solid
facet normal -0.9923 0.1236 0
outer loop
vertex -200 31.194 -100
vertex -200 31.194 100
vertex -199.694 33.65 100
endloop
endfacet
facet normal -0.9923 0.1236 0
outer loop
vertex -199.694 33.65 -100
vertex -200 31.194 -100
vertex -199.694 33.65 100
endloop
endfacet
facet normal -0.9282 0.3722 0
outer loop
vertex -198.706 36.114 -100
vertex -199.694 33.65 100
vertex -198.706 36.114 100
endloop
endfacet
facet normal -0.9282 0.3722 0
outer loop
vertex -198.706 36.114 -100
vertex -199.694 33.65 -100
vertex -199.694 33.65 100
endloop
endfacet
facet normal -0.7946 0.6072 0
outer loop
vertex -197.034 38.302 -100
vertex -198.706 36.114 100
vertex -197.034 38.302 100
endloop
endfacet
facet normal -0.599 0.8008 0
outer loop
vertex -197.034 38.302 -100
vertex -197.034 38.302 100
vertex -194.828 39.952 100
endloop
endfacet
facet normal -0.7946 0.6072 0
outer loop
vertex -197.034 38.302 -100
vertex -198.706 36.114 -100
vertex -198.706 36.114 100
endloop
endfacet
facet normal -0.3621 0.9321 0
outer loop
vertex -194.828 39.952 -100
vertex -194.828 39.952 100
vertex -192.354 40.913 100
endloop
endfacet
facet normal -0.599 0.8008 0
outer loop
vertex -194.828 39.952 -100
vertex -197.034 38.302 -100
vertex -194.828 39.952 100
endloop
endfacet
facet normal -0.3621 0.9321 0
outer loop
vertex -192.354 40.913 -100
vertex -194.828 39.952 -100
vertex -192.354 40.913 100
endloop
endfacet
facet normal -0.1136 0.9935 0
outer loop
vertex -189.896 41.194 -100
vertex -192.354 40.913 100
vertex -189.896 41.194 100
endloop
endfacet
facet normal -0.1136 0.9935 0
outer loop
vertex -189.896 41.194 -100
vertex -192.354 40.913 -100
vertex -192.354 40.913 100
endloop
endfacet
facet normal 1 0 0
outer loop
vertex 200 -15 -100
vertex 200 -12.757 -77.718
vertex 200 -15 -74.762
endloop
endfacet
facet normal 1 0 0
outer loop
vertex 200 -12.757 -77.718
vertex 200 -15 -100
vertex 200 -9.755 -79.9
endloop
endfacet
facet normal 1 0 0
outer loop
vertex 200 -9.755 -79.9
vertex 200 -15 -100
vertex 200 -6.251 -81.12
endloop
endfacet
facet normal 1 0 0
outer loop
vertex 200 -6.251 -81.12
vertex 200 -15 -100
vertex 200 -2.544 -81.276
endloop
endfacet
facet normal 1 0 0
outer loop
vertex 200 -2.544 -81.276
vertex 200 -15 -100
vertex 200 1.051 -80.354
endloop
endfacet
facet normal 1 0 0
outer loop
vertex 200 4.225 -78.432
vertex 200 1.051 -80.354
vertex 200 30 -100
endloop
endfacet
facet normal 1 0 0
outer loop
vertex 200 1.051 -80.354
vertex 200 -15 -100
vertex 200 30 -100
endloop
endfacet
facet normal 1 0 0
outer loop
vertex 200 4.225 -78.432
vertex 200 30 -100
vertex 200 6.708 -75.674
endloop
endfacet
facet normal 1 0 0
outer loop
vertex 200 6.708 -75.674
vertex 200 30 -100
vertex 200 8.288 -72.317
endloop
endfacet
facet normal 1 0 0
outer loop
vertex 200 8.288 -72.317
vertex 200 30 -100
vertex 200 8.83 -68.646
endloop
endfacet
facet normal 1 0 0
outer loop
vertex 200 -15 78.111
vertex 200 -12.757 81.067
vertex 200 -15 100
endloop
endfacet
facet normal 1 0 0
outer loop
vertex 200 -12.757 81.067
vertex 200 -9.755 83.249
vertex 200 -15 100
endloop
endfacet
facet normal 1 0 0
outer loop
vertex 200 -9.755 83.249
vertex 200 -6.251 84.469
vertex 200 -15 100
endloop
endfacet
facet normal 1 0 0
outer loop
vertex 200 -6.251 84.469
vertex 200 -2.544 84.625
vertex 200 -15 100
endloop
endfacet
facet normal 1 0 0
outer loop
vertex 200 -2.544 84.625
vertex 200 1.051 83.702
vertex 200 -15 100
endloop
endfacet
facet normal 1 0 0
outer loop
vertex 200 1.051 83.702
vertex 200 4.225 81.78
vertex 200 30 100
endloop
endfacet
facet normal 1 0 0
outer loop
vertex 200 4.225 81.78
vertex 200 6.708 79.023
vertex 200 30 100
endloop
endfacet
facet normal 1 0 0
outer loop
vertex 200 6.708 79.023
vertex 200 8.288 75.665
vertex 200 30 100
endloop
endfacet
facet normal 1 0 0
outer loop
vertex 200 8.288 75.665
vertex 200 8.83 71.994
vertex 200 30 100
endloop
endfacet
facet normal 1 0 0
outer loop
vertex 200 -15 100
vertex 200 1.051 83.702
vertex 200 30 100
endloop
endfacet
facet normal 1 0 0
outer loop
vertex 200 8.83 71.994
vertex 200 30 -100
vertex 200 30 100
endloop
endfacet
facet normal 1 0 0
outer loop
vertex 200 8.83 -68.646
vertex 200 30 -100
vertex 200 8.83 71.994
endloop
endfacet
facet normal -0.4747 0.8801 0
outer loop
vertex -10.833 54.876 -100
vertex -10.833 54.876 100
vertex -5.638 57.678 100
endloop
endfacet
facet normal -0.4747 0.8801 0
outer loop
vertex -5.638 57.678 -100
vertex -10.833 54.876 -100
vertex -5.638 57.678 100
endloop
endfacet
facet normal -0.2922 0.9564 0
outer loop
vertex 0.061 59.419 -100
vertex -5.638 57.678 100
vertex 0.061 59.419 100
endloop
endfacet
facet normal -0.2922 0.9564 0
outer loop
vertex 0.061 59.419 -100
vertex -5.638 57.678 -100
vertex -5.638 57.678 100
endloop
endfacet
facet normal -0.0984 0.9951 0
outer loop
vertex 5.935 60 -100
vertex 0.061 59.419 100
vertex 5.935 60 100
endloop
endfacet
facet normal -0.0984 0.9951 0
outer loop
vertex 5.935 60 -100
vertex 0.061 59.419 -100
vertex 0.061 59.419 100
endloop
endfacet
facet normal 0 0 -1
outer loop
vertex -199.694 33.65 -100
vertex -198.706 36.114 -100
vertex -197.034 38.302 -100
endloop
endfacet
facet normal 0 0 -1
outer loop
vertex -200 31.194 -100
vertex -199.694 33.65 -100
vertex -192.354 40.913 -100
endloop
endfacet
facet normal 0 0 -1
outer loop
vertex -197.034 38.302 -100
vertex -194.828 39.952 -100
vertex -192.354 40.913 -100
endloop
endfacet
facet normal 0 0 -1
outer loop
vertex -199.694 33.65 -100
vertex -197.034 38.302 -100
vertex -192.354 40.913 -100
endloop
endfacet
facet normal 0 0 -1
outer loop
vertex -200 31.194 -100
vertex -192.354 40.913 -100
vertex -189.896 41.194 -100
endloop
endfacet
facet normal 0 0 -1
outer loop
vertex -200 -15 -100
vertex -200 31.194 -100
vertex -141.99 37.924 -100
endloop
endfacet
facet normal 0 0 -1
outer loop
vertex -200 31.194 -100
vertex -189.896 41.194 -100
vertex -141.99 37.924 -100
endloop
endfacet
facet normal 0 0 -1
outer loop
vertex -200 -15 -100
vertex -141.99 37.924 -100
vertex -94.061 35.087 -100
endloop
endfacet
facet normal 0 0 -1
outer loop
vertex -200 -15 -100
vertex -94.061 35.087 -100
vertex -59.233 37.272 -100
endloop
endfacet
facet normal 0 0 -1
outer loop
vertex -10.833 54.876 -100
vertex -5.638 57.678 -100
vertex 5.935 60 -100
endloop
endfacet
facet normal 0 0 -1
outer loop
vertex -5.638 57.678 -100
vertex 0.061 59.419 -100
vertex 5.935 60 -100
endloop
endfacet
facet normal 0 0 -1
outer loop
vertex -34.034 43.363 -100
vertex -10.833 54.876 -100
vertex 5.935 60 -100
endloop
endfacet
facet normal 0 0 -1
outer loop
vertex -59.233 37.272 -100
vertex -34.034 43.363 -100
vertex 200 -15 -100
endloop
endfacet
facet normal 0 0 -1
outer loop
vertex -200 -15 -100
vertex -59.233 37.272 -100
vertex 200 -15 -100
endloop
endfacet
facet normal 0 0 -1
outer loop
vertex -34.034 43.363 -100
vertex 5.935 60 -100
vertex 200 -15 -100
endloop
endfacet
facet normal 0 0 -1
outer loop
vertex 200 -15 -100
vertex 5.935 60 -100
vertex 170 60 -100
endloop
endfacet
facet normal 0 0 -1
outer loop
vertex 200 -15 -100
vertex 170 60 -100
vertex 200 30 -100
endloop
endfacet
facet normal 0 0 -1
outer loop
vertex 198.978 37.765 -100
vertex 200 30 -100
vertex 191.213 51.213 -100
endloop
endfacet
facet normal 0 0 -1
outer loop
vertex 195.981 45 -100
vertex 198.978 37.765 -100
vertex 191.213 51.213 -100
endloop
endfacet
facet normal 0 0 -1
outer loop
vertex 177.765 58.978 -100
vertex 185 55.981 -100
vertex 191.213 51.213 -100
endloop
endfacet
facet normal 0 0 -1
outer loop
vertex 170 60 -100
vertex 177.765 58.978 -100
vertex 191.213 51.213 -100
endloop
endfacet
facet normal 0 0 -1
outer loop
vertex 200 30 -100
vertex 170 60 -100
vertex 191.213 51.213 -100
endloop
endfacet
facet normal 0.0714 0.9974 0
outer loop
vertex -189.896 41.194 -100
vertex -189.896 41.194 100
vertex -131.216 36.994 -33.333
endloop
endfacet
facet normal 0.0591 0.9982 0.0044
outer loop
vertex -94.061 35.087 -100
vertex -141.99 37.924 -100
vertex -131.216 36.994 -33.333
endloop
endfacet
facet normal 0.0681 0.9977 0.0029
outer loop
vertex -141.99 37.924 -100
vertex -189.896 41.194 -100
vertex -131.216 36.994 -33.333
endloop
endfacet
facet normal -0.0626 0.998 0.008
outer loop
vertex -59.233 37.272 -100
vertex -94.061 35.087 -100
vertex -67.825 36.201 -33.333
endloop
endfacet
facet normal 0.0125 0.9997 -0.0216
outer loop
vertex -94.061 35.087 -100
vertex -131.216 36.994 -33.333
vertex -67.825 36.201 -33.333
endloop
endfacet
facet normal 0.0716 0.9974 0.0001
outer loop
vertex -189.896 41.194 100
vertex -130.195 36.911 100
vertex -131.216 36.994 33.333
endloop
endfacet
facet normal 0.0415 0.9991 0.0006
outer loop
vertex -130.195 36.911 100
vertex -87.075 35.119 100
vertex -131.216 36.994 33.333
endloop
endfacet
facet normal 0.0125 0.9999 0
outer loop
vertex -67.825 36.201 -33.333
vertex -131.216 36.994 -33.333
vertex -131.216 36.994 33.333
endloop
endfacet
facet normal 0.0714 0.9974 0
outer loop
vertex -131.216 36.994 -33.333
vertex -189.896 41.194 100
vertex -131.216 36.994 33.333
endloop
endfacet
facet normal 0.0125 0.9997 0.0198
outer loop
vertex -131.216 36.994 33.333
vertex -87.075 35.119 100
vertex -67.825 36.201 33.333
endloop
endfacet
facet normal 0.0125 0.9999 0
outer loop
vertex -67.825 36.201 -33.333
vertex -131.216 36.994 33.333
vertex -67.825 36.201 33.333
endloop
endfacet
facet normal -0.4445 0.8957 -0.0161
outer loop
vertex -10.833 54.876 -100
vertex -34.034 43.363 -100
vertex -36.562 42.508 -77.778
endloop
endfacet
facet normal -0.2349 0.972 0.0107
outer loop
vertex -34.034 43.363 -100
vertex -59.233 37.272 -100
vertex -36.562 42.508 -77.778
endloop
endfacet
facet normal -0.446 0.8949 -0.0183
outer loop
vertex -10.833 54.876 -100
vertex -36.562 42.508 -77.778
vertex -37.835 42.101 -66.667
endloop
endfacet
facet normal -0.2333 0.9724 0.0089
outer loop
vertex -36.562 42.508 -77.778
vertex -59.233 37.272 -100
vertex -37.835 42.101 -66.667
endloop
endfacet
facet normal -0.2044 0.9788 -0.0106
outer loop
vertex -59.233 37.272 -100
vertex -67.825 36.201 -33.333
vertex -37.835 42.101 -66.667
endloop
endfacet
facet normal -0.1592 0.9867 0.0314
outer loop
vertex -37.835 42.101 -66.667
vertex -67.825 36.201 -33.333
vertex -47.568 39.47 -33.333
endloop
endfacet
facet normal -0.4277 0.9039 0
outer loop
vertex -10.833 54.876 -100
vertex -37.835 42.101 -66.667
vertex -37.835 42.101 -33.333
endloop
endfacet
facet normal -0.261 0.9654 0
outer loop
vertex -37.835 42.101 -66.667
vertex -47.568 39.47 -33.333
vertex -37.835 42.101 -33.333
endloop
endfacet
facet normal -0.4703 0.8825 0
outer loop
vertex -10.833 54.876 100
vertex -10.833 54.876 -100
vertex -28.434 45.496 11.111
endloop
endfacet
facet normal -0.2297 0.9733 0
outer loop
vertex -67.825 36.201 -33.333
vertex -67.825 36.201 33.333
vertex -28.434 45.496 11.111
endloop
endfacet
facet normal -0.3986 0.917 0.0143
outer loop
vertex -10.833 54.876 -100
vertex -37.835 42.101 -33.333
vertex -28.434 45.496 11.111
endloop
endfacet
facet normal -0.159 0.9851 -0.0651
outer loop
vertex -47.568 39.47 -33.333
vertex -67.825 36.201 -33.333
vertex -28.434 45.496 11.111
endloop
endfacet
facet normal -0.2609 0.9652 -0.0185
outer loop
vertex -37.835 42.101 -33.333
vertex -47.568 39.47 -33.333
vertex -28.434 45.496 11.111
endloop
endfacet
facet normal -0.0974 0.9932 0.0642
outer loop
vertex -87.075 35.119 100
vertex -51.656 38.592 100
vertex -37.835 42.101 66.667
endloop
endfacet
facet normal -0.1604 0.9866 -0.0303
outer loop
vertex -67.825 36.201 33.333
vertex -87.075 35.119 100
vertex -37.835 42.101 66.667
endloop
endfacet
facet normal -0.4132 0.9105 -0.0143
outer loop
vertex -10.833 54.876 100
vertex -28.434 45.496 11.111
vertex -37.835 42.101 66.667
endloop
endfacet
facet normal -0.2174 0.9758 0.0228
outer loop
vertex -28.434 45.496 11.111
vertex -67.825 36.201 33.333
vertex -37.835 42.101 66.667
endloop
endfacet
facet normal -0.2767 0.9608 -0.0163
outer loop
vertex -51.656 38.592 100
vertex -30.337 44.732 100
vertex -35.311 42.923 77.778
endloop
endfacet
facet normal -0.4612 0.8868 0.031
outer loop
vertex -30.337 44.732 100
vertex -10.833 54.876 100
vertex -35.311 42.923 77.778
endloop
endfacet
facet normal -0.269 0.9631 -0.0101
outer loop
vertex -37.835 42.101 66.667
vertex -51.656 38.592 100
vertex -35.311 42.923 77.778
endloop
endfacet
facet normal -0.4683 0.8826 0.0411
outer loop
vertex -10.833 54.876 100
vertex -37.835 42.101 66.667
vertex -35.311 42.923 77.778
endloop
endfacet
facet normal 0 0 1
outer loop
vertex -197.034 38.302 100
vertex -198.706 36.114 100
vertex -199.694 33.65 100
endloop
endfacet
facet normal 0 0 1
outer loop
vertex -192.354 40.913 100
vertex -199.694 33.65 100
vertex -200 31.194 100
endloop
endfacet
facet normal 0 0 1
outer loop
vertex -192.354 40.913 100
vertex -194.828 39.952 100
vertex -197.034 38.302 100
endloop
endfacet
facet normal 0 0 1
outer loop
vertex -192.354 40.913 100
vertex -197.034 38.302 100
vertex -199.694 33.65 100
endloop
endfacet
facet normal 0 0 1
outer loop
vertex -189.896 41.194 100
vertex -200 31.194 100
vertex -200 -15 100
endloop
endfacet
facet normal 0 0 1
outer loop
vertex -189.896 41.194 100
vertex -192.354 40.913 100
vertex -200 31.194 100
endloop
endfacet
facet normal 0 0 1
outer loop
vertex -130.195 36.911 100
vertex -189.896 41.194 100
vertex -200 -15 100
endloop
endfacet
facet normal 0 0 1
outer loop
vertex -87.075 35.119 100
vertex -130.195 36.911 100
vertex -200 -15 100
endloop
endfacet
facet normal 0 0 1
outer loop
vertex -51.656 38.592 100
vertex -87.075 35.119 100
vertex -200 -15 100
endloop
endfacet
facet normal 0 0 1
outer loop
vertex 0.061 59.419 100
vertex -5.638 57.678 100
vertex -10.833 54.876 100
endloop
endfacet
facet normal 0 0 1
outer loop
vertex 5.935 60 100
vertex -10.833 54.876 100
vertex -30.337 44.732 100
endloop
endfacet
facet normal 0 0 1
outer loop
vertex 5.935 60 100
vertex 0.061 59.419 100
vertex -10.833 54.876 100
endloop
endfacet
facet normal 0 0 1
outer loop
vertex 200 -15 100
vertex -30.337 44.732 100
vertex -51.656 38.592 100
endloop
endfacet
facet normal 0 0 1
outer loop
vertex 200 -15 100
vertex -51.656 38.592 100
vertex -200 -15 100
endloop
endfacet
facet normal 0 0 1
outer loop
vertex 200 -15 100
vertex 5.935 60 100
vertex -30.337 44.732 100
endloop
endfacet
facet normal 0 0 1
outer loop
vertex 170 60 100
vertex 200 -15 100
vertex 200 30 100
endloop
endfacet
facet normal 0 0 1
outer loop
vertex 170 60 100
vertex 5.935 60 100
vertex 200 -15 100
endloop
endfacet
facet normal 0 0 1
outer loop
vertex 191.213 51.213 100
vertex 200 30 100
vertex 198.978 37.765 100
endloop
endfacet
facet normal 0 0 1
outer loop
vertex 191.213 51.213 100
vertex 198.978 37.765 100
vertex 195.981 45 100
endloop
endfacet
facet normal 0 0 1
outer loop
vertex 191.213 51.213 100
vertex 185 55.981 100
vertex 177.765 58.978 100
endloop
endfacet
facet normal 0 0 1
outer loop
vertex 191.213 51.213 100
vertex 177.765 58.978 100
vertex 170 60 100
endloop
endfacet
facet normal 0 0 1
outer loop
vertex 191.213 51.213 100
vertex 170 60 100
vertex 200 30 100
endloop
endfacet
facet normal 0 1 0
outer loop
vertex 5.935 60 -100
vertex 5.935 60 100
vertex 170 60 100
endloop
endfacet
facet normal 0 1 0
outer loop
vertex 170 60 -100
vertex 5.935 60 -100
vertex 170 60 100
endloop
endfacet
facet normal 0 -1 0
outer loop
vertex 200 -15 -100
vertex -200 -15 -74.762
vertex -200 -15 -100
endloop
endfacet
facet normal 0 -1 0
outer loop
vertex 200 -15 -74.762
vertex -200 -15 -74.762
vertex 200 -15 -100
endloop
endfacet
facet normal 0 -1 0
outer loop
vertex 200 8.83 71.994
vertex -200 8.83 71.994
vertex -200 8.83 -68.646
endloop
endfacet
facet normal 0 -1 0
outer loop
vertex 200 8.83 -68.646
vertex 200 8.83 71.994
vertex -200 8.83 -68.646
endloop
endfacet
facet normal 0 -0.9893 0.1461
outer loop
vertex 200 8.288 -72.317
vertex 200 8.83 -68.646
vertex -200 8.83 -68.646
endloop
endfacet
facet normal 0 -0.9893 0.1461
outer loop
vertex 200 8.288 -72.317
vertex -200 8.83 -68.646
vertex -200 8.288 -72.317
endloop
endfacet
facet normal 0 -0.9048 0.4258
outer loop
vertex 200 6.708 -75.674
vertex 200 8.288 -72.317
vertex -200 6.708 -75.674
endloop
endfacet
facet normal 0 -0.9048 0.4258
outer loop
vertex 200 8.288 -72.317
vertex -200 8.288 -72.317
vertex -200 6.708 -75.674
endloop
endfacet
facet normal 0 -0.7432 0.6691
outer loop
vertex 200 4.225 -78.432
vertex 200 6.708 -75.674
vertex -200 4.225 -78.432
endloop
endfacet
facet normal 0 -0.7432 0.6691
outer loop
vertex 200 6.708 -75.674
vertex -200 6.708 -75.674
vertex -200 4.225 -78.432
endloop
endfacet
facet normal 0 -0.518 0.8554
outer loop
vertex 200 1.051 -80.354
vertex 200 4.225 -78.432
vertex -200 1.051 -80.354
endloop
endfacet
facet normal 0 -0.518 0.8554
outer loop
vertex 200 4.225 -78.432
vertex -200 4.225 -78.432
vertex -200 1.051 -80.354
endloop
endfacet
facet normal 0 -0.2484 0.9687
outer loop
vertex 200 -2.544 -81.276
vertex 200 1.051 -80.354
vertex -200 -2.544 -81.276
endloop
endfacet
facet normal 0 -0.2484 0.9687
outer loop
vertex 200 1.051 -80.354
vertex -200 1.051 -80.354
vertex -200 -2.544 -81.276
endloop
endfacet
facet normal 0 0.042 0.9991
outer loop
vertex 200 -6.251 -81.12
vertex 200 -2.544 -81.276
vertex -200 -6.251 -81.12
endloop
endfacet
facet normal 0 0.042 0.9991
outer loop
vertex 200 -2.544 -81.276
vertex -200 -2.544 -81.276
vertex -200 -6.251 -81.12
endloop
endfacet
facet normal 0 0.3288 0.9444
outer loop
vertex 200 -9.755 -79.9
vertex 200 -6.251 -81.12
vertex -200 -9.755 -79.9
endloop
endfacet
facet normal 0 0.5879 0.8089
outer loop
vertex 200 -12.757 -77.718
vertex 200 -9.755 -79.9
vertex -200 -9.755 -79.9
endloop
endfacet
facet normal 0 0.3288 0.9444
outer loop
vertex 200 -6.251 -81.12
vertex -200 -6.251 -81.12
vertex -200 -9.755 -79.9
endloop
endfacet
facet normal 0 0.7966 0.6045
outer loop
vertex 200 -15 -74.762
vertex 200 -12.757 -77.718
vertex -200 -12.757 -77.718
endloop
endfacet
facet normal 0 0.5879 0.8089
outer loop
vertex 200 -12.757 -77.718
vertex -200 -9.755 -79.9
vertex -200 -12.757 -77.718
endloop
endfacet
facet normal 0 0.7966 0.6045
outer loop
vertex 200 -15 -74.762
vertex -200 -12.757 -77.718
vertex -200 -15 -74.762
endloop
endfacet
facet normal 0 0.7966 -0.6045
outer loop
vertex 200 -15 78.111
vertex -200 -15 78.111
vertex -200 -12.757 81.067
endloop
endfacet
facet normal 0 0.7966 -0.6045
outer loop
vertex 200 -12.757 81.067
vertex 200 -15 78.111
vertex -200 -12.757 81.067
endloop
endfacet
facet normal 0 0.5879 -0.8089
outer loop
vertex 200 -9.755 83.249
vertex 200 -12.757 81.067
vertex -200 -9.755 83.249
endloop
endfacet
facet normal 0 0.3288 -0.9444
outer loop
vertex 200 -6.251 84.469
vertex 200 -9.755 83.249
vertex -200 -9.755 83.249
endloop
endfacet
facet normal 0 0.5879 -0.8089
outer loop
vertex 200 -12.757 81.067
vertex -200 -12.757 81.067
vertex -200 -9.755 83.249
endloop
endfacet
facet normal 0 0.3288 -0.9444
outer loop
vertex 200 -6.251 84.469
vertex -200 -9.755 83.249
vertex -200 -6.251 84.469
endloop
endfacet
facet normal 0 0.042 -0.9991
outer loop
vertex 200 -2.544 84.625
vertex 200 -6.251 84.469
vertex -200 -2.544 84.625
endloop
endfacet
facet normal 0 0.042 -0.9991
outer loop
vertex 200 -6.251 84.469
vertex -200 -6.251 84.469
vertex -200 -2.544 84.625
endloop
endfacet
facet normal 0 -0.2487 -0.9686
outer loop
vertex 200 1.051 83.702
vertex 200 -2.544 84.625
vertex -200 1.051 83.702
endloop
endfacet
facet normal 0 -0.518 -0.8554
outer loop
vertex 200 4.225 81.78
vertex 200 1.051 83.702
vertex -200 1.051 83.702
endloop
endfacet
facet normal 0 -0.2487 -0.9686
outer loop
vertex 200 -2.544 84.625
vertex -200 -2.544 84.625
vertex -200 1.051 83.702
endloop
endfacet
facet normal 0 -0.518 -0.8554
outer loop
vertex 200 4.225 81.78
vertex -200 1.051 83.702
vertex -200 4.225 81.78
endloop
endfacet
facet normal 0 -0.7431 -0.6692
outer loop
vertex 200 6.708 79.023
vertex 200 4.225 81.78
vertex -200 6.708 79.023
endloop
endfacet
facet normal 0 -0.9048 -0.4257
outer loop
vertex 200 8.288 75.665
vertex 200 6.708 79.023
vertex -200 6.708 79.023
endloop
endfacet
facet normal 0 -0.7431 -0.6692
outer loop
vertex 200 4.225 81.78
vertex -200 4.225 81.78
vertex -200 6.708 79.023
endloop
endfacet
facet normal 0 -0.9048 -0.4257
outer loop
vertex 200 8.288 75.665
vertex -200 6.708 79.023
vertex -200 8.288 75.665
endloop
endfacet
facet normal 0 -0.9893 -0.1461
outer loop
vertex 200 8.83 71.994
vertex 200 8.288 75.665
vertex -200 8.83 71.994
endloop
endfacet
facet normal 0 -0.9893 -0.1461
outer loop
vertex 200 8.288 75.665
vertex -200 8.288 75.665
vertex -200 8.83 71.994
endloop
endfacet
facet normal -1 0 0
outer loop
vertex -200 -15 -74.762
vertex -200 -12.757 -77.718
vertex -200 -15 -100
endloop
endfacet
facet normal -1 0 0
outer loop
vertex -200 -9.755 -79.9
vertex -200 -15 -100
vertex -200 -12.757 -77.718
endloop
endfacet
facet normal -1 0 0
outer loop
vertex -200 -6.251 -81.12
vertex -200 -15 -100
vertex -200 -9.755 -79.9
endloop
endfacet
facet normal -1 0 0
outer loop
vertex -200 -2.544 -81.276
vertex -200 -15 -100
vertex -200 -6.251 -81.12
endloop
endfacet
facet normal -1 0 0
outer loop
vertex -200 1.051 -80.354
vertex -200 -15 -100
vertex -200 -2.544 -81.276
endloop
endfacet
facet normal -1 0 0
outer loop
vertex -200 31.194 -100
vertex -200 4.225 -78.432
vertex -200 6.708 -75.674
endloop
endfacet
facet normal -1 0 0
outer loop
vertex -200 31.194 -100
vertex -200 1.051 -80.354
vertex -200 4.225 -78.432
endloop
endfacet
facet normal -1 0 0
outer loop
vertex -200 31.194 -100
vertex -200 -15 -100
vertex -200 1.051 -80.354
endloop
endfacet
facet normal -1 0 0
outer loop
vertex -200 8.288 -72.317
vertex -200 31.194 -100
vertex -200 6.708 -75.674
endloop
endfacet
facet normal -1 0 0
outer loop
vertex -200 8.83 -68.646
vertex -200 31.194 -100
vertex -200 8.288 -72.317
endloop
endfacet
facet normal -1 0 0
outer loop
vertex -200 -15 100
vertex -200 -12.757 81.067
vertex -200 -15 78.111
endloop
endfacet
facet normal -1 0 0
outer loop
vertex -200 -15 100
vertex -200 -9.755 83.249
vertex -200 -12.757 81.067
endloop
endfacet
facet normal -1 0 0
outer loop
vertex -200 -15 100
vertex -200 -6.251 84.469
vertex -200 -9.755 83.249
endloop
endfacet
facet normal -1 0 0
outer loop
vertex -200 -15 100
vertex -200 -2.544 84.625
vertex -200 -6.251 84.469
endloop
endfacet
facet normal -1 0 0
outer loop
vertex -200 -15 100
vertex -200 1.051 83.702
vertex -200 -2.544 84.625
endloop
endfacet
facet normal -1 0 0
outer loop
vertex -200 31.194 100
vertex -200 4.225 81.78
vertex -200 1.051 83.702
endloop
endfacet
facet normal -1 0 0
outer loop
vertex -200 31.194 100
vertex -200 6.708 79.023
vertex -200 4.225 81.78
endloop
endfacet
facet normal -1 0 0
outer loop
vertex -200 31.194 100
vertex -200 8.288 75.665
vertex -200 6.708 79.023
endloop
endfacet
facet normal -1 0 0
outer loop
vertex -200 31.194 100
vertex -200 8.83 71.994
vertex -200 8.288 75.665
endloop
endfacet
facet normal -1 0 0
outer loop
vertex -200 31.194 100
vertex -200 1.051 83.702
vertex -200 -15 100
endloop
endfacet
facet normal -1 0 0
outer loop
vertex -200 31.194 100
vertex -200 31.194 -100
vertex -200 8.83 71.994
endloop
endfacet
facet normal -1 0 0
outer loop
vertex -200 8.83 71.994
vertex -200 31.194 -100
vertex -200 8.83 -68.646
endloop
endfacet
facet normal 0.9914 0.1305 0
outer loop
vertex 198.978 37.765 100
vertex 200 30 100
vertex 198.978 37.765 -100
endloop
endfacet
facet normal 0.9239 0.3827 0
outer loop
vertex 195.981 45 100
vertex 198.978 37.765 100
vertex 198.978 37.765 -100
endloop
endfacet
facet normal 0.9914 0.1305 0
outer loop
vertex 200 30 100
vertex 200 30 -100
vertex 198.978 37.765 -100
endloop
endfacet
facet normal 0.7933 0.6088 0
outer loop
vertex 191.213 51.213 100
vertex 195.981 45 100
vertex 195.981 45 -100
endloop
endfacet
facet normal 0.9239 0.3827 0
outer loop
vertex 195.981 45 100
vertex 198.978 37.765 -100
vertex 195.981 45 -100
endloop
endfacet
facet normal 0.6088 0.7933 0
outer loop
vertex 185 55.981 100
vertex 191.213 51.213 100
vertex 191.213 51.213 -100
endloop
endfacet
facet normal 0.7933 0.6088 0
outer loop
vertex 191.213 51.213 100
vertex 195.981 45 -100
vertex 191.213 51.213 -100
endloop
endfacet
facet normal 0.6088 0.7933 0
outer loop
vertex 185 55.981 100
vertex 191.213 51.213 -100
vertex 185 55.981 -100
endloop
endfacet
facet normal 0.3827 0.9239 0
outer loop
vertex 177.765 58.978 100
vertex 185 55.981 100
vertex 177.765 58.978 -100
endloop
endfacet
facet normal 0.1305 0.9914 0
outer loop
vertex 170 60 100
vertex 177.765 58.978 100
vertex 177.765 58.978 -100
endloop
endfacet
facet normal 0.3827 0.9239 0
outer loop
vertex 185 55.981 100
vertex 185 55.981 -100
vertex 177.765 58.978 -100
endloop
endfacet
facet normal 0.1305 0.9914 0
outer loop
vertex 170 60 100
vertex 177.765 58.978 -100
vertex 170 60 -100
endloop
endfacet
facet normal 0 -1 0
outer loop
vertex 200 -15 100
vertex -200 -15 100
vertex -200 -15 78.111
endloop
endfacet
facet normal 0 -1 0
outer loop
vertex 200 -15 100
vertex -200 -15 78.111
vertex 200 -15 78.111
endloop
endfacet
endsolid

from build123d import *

# Parameters (mm, degrees)
SKETCH1_W           = 400
SKETCH1_H           = 200
BOSS_EXTRUDE1_DEPTH = 60
CUT_EXTRUDE1_DEPTH  = 220
FILLET1_R           = 30
FILLET2_R           = 10
SKETCH9_W           = 400
SKETCH9_H           = 200
BOSS_EXTRUDE4_DEPTH = 15
CUT_EXTRUDE9_DEPTH  = 417.653333254


with BuildPart() as part:
    # Sketch1 → Boss-Extrude1 (new body)
    with BuildSketch(Plane(origin=(0, 0, 0), x_dir=(1, 0, 0), z_dir=(0, 1, 0))):
        Rectangle(SKETCH1_W, SKETCH1_H)
    extrude(amount=BOSS_EXTRUDE1_DEPTH)

    # Sketch3 → Cut-Extrude1 (cut)
    with BuildSketch(Plane.XY.offset(100)):
        with BuildLine():
            Line((-200, 41.033284164), (-200, 60))
            Line((-200, 60), (-3.947040737, 60))
            add(Edge.make_bspline(
                [(-200, 41.033284164), (-145.162329498, 43.56543882), (-56.826978114, 16.661467413), (-3.947040737, 60)],
                knots=[0, 0, 0, 0, 1, 1, 1, 1], degree=3))
        make_face()
    extrude(amount=-CUT_EXTRUDE1_DEPTH, mode=Mode.SUBTRACT)

    # Fillet1
    fillet1_edges = [part.edges().sort_by_distance(p)[0] for p in [
        (-3.947040737, 60, 0),
        (200, 60, 0),
    ]]
    fillet(fillet1_edges, radius=FILLET1_R)

    # Fillet2
    fillet2_edges = [part.edges().sort_by_distance(p)[0] for p in [
        (-200, 41.033284164, 0),
    ]]
    fillet(fillet2_edges, radius=FILLET2_R)

    # Sketch9 → Boss-Extrude4 (add)
    with BuildSketch(Plane.XZ):
        Rectangle(SKETCH9_W, SKETCH9_H)
    extrude(amount=BOSS_EXTRUDE4_DEPTH)

    # Sketch10 → Cut-Extrude9 (cut, through all)
    with BuildSketch(Plane.ZY.offset(200)):
        with BuildLine():
            Line((-74.762482239, -15), (1.674345002, -15))
            Line((1.674345002, -15), (1.674345002, 8.829888791))
            Line((1.674345002, 8.829888791), (-68.645654998, 8.829888791))
            ThreePointArc((-68.645654998, 8.829888791), (-80.94686607, -0.71254788), (-74.762482239, -15))
        make_face()
        with BuildLine():
            Line((1.674345002, 8.829888791), (1.674345002, -15))
            Line((1.674345002, -15), (78.111172243, -15))
            ThreePointArc((78.111172243, -15), (84.295556073, -0.71254788), (71.994345002, 8.829888791))
            Line((71.994345002, 8.829888791), (1.674345002, 8.829888791))
        make_face()
    extrude(amount=-CUT_EXTRUDE9_DEPTH, mode=Mode.SUBTRACT)


solid = part.part
